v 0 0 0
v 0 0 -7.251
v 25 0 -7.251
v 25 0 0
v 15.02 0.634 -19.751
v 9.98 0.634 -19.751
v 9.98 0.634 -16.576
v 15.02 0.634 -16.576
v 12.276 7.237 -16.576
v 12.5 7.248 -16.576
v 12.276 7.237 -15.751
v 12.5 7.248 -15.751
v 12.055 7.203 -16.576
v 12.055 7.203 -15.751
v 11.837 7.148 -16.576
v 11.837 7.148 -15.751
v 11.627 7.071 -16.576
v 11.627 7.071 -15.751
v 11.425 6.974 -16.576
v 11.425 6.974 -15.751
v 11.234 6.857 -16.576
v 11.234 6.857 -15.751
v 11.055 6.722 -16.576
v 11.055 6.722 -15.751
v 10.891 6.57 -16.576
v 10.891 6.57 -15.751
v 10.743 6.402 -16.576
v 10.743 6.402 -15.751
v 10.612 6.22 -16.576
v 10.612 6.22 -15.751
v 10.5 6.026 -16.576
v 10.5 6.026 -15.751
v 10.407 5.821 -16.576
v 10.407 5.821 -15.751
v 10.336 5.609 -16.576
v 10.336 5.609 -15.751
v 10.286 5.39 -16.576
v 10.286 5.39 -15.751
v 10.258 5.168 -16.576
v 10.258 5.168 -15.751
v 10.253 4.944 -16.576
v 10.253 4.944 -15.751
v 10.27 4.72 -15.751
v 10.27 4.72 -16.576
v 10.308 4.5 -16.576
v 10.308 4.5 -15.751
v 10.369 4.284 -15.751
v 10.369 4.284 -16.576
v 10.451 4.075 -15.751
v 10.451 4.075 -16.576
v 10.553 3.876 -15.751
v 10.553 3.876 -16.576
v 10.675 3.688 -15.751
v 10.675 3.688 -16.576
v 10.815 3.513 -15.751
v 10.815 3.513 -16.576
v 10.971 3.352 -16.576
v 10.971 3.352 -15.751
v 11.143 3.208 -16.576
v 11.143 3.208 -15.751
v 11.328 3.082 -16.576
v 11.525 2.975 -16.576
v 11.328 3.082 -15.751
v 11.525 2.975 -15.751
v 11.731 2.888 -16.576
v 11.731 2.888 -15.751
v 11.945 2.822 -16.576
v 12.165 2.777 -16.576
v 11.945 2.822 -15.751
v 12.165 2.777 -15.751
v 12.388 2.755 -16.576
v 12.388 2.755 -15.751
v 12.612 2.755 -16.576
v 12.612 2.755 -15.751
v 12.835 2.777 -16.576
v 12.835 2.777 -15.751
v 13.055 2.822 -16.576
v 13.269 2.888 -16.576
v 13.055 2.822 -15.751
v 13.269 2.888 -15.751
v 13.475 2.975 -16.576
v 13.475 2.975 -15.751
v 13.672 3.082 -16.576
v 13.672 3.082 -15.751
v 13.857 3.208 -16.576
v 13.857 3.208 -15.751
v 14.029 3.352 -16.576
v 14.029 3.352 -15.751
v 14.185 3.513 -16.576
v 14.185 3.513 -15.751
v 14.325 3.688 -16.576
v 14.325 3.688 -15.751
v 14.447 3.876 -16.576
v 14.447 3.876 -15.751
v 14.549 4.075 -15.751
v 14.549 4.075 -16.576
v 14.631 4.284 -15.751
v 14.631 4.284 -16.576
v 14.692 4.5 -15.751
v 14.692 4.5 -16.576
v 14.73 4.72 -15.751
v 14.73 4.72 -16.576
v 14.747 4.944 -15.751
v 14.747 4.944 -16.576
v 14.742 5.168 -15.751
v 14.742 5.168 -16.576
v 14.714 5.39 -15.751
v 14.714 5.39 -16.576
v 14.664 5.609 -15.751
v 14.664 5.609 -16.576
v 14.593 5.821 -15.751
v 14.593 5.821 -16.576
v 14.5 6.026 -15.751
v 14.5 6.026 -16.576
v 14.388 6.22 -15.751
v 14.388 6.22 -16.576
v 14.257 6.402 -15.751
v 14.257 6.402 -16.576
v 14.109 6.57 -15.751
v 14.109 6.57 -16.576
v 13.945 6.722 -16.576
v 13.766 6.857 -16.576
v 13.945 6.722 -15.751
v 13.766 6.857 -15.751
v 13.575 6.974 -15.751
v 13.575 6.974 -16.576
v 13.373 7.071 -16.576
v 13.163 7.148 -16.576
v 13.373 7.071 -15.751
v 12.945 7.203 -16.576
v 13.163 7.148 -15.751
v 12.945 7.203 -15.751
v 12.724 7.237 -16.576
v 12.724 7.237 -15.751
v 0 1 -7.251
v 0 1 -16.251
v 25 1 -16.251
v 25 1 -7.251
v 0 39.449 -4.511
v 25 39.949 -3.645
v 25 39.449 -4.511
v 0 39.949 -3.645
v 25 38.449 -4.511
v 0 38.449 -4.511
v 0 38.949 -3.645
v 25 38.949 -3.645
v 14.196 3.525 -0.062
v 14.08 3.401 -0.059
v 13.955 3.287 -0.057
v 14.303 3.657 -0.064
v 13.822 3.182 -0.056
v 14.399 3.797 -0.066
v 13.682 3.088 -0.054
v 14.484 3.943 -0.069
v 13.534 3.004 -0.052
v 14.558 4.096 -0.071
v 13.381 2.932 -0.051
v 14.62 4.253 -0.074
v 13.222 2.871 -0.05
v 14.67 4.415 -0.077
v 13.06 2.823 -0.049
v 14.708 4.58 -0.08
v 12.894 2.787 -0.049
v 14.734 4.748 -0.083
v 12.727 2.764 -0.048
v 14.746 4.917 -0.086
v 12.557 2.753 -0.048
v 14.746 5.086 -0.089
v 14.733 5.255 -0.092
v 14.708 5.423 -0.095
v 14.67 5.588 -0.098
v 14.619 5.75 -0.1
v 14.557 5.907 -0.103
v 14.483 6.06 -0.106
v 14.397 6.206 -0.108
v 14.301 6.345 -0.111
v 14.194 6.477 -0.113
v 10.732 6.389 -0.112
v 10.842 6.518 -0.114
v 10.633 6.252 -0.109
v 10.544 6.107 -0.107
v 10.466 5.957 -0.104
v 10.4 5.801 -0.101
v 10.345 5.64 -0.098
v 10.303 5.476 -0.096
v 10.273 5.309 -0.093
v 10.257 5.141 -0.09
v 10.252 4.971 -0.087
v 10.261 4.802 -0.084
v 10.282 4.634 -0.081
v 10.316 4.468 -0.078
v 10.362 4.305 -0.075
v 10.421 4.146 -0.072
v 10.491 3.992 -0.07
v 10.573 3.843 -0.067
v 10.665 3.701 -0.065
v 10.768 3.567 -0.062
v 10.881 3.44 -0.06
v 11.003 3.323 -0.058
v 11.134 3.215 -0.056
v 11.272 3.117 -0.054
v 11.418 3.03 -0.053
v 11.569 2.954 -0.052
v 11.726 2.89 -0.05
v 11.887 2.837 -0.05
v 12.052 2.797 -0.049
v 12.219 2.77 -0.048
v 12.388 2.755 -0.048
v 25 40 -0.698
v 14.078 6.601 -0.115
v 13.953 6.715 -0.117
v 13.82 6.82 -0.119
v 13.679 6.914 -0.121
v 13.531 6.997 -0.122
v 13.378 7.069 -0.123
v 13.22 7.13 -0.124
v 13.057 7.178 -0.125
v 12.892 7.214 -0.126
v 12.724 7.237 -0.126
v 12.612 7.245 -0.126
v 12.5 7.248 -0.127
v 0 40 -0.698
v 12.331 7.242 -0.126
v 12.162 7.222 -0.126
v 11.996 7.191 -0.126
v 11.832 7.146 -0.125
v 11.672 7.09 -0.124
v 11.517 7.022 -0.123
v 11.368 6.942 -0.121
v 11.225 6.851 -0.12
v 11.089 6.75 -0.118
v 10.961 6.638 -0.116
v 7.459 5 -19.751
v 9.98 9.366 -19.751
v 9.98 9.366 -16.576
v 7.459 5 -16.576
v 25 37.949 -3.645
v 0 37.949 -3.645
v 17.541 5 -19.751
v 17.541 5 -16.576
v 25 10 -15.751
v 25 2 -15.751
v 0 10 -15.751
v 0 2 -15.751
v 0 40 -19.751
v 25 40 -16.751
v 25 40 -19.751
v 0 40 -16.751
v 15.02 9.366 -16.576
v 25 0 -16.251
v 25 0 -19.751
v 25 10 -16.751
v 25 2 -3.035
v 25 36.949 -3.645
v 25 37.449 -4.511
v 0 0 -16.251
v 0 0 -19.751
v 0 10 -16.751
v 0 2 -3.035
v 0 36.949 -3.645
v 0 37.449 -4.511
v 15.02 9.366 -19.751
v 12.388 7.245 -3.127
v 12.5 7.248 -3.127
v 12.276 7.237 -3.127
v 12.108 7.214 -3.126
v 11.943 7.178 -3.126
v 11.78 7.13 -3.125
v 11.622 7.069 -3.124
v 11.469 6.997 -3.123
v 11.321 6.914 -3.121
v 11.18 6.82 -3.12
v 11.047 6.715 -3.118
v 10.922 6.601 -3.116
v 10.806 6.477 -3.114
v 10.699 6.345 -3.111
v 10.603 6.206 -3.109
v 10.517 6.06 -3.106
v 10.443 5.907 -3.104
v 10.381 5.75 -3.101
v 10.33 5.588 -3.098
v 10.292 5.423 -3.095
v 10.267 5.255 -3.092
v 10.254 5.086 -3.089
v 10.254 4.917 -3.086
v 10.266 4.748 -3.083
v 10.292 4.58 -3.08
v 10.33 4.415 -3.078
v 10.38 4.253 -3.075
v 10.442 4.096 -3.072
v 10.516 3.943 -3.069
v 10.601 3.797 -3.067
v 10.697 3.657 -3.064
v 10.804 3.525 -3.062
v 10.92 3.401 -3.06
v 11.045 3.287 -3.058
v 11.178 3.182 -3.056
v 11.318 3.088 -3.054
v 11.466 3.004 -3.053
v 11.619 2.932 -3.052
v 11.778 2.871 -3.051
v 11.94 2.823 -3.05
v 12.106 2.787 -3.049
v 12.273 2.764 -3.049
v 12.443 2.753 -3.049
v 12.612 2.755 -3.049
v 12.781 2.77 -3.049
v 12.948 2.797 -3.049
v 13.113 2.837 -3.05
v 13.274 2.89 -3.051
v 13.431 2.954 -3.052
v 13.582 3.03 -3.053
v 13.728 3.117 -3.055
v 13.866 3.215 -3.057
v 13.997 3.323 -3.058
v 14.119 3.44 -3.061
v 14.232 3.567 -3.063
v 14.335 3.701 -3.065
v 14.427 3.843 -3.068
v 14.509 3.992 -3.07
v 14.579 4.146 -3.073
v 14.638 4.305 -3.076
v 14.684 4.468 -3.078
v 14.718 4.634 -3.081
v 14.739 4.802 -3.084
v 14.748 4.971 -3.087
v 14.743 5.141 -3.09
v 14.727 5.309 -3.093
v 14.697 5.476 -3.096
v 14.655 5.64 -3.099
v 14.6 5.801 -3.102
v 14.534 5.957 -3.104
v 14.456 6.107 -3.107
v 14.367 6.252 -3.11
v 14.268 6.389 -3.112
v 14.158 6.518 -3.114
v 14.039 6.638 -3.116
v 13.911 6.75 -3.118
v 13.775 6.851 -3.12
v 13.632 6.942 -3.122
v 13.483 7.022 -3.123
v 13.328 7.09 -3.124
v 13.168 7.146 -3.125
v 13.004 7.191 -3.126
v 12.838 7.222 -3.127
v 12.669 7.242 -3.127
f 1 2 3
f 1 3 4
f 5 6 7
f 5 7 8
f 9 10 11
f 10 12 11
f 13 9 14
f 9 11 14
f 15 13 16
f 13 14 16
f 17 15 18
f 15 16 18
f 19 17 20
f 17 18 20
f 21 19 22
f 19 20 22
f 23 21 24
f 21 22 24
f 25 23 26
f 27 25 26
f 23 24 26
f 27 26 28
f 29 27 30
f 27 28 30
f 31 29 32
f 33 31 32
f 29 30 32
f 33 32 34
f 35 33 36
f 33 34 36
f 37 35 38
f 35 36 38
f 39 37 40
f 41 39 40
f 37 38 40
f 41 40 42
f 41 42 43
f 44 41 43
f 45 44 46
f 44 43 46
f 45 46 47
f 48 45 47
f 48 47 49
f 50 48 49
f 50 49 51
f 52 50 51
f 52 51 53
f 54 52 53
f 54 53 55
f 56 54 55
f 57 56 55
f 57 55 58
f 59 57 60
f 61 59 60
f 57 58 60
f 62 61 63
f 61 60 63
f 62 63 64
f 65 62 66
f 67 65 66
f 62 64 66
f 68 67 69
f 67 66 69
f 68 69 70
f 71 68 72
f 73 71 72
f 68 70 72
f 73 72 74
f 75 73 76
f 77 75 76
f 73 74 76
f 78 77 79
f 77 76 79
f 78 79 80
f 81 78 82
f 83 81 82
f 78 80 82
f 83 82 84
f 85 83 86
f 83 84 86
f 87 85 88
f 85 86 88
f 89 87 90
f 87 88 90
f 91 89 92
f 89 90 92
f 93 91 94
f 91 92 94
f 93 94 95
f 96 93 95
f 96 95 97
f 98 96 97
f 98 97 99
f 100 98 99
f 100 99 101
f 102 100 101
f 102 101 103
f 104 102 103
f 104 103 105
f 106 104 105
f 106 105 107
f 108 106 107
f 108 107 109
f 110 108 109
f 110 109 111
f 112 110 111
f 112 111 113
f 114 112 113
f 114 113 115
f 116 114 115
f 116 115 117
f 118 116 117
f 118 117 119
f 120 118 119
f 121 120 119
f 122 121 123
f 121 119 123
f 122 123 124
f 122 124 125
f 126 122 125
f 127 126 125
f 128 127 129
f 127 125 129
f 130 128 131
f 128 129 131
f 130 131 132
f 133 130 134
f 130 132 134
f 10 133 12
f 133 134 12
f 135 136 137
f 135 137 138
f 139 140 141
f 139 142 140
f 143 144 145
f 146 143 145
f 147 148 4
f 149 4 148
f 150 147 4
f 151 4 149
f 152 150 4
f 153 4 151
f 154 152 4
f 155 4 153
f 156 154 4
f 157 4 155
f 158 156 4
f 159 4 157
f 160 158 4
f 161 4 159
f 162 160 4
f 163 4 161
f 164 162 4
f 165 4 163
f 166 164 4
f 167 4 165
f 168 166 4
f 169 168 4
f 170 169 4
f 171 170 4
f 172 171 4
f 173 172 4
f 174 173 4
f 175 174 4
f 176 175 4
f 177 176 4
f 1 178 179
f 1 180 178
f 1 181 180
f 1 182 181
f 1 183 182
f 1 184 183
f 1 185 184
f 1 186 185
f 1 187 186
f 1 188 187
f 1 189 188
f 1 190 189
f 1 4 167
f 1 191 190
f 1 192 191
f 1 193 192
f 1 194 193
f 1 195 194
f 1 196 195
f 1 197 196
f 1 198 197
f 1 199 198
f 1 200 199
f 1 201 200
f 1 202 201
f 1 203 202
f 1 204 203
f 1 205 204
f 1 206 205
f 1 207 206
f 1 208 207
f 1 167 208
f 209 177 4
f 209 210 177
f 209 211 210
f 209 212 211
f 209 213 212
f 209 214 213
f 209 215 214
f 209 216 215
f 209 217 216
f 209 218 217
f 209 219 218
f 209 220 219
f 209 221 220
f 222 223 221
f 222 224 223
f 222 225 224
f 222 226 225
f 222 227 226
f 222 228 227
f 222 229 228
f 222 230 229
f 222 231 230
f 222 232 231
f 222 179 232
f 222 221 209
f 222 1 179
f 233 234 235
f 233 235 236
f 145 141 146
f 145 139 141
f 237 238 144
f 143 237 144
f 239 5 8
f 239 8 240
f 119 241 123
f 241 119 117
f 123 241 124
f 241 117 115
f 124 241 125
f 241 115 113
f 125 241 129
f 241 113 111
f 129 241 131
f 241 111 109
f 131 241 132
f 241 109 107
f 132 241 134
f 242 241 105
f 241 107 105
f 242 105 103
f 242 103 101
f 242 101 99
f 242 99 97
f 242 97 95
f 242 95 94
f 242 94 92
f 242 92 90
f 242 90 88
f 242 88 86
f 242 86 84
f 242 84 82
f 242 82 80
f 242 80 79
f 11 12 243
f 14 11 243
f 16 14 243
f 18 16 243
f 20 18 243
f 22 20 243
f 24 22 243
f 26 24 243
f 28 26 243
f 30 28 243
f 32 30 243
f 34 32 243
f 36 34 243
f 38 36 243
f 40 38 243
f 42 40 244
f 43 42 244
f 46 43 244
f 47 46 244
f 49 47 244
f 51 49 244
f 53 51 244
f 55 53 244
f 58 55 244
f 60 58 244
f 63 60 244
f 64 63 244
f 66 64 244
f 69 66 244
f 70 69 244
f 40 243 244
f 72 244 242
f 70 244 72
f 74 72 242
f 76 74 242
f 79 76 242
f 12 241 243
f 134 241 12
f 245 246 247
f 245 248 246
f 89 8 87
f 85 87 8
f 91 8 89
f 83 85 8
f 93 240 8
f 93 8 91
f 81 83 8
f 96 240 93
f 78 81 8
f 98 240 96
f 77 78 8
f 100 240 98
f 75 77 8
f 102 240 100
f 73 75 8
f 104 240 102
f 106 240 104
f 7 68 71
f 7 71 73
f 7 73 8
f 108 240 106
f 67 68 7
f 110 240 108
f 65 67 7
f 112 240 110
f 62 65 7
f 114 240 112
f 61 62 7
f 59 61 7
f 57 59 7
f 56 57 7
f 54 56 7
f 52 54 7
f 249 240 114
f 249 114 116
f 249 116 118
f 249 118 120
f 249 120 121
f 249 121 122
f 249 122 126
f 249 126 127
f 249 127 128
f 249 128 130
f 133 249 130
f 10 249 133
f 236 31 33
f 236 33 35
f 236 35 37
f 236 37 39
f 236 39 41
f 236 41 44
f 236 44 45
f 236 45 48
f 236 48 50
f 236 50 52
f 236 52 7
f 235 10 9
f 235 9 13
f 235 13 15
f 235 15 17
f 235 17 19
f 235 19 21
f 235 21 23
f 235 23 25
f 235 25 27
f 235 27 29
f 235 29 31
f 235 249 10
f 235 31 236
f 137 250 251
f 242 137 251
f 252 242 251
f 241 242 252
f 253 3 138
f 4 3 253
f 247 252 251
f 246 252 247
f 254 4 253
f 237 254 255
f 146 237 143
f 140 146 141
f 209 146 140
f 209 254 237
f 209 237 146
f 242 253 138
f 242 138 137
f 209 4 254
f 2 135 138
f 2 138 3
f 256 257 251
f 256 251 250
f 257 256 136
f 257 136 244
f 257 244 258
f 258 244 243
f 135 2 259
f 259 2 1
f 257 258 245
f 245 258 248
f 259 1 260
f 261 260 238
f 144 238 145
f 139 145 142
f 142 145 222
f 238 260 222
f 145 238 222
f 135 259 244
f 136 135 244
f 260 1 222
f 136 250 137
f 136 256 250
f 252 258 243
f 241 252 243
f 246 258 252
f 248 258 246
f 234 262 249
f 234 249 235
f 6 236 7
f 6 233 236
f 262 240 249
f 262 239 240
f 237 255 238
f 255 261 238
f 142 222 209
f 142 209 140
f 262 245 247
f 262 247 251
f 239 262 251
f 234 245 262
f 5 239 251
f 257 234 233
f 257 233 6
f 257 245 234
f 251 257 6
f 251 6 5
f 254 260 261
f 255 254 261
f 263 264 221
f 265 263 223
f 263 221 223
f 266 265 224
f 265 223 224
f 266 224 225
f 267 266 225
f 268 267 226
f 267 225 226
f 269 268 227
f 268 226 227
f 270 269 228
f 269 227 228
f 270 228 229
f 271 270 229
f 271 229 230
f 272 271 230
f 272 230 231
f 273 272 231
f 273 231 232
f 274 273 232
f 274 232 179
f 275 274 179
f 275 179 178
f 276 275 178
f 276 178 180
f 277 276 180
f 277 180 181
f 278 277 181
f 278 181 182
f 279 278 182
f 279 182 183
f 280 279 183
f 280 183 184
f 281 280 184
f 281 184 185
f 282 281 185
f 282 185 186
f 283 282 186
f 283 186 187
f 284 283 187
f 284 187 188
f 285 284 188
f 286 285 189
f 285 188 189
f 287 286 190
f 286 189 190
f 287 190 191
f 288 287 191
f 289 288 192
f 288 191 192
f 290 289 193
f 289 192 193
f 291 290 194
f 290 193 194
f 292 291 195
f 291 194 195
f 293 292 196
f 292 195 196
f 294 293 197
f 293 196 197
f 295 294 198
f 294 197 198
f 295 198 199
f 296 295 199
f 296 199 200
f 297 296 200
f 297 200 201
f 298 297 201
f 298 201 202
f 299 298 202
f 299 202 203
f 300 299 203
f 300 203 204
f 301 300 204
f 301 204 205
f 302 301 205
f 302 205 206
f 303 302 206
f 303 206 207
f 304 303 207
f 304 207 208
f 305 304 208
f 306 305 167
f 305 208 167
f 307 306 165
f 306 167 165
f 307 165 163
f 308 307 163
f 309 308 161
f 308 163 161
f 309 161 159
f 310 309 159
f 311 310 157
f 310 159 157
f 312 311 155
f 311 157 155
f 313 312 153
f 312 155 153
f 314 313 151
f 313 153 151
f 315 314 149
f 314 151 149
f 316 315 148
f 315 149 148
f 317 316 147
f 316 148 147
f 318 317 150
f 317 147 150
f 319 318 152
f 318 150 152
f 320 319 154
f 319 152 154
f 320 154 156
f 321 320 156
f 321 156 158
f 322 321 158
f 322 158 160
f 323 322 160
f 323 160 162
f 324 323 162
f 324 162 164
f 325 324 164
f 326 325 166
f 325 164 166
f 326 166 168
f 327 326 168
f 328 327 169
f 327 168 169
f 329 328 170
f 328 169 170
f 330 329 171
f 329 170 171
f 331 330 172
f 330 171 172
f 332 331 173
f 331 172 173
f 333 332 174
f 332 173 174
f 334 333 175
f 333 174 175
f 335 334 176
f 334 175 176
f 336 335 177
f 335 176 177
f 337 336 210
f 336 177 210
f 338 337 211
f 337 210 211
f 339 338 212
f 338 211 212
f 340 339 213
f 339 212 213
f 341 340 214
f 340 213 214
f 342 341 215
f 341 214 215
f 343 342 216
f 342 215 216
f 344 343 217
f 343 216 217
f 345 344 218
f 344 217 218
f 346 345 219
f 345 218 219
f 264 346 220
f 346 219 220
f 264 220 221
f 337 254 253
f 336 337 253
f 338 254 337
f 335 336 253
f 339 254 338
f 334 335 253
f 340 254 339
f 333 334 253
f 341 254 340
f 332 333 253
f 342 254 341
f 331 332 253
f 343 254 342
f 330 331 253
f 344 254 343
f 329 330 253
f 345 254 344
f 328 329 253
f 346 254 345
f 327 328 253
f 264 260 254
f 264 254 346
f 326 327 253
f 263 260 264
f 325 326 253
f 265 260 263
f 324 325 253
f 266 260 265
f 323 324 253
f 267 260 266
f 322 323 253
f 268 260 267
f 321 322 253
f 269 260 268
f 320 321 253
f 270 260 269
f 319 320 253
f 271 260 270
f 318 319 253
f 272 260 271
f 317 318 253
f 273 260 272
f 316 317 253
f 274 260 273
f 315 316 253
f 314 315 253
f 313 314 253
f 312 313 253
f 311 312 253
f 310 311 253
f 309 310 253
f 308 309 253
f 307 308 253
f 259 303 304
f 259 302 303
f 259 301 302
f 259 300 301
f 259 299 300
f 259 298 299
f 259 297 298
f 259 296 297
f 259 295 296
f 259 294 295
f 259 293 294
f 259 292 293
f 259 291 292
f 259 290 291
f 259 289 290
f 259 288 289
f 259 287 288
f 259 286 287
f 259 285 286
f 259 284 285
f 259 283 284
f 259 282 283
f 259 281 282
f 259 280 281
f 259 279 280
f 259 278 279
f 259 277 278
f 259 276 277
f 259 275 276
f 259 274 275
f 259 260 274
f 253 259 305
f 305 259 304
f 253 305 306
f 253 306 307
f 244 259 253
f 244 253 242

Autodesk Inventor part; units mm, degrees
ref_plane "YZ Plane" through (0, 0, 0) normal (1, 0, 0) x (0, 1, 0)
ref_plane "XZ Plane" through (0, 0, 0) normal (0, 1, 0) x (-1, 0, 0)
ref_plane "XY Plane" through (0, 0, 0) normal (0, 0, 1) x (1, 0, 0)
sketch "Sketch1" plane through (0, 0, 0) normal (1, 0, 0) x (0, 1, 0)
  line L0 (0, 0) -> (40, -0.6982)
  line L1 (40, -0.6982) -> (39.9486, -3.6454)
  line L2 (39.9486, -3.6454) -> (36.9486, -3.6454)
  line L3 (36.9486, -3.6454) -> (2, -3.0354)
  line L4 (2, -3.0354) -> (2, -16.7514)
  line L5 (2, -16.7514) -> (40, -16.7514)
  line L6 (40, -16.7514) -> (40, -19.7514)
  line L7 (40, -19.7514) -> (0, -19.7514)
  line L8 (0, -19.7514) -> (0, 0)
  line L9 (10, -16.7514) -> (10, -15.7514)
  line L10 (10, -15.7514) -> (2, -15.7514)
  line L11 (39.9486, -3.6454) -> (39.4486, -4.5114)
  line L12 (39.9486, -3.6454) -> (40.9486, -3.6454) construction
  line L13 (39.4486, -4.5114) -> (38.9486, -3.6454)
  line L14 (36.9486, -3.6454) -> (37.4486, -4.5114)
  line L15 (37.4486, -4.5114) -> (37.9486, -3.6454)
  line L16 (37.9486, -3.6454) -> (38.4486, -4.5114)
  line L17 (38.4486, -4.5114) -> (38.9486, -3.6454)
  line L18 (0, -5.2681) -> (1, -5.2681)
  line L19 (1, -5.2681) -> (1, -14.2681)
  line L20 (1, -14.2681) -> (0, -14.2681)
  dimension "d5" = 40
  dimension "d6" = 13.716
  dimension "d7" = 3
  dimension "d8" = 3
  dimension "d9" = 40
  dimension "d10" = 3
  dimension "d11" = 2
  dimension "d12" = 89
  dimension "d13" = 1
  dimension "d14" = 30
  dimension "d15" = 1
  dimension "d16" = 120
  dimension "d17" = 120
  dimension "d18" = 60
  dimension "d19" = 60
  dimension "d20" = 1
  dimension "d33" = 1
  dimension "d34" = 9
extrude "Extrusion1" add sketch "Sketch1" along normal blind 25
sketch "Sketch2" plane through (0, 0, -19.7514) normal (0, 0, -1) x (-1, 0, 0)
  line L0 (0, 10) -> (-25, 10) projected
  line L1 (-25, 10) -> (0, 0)
  line L2 (-7.459, 5) -> (-9.9795, 0.6344)
  line L3 (-9.9795, 0.6344) -> (-15.0205, 0.6344)
  line L4 (-15.0205, 0.6344) -> (-17.541, 5)
  line L5 (-17.541, 5) -> (-15.0205, 9.3656)
  line L6 (-15.0205, 9.3656) -> (-9.9795, 9.3656)
  line L7 (-9.9795, 9.3656) -> (-7.459, 5)
  point P0 (-12.5, 5)
  dimension "d23" = 8.7312
extrude "Extrusion2" cut sketch "Sketch2" against normal blind 3.175
sketch "Sketch3" plane through (0, 0, -16.5764) normal (0, 0, -1) x (-1, 0, 0)
  point P0 (0, 0)
  point P1 (-12.5, 5)
hole "Hole1" at (12.5, 5, -16.5764) direction (0, 0, 1) diameter 4.4958 end through all
sketch "Sketch4" plane through (0, 0, 0) normal (-1, 0, 0) x (0, 0, 1)
  line L0 (-19.7514, 0) -> (-19.7514, 40) projected
  line L1 (0, 0) -> (-19.7514, 0) projected
  line L2 (-7.2514, 0) -> (-16.2514, 0)
  line L3 (-16.2514, 0) -> (-16.2514, 1)
  line L4 (-16.2514, 1) -> (-7.2514, 1)
  line L5 (-7.2514, 1) -> (-7.2514, 0)
  dimension "d35" = 9
  dimension "d36" = 1
  dimension "d38" = 3.5
extrude "Extrusion3" cut sketch "Sketch4" against normal through all
equation "\"d6\" = StretcherDepth"
equation "\"d8\" = d7"
equation "\"d9\" = d5"
equation "\"StretcherDepth\" = 13.716"
properties part number "MotorClip"
